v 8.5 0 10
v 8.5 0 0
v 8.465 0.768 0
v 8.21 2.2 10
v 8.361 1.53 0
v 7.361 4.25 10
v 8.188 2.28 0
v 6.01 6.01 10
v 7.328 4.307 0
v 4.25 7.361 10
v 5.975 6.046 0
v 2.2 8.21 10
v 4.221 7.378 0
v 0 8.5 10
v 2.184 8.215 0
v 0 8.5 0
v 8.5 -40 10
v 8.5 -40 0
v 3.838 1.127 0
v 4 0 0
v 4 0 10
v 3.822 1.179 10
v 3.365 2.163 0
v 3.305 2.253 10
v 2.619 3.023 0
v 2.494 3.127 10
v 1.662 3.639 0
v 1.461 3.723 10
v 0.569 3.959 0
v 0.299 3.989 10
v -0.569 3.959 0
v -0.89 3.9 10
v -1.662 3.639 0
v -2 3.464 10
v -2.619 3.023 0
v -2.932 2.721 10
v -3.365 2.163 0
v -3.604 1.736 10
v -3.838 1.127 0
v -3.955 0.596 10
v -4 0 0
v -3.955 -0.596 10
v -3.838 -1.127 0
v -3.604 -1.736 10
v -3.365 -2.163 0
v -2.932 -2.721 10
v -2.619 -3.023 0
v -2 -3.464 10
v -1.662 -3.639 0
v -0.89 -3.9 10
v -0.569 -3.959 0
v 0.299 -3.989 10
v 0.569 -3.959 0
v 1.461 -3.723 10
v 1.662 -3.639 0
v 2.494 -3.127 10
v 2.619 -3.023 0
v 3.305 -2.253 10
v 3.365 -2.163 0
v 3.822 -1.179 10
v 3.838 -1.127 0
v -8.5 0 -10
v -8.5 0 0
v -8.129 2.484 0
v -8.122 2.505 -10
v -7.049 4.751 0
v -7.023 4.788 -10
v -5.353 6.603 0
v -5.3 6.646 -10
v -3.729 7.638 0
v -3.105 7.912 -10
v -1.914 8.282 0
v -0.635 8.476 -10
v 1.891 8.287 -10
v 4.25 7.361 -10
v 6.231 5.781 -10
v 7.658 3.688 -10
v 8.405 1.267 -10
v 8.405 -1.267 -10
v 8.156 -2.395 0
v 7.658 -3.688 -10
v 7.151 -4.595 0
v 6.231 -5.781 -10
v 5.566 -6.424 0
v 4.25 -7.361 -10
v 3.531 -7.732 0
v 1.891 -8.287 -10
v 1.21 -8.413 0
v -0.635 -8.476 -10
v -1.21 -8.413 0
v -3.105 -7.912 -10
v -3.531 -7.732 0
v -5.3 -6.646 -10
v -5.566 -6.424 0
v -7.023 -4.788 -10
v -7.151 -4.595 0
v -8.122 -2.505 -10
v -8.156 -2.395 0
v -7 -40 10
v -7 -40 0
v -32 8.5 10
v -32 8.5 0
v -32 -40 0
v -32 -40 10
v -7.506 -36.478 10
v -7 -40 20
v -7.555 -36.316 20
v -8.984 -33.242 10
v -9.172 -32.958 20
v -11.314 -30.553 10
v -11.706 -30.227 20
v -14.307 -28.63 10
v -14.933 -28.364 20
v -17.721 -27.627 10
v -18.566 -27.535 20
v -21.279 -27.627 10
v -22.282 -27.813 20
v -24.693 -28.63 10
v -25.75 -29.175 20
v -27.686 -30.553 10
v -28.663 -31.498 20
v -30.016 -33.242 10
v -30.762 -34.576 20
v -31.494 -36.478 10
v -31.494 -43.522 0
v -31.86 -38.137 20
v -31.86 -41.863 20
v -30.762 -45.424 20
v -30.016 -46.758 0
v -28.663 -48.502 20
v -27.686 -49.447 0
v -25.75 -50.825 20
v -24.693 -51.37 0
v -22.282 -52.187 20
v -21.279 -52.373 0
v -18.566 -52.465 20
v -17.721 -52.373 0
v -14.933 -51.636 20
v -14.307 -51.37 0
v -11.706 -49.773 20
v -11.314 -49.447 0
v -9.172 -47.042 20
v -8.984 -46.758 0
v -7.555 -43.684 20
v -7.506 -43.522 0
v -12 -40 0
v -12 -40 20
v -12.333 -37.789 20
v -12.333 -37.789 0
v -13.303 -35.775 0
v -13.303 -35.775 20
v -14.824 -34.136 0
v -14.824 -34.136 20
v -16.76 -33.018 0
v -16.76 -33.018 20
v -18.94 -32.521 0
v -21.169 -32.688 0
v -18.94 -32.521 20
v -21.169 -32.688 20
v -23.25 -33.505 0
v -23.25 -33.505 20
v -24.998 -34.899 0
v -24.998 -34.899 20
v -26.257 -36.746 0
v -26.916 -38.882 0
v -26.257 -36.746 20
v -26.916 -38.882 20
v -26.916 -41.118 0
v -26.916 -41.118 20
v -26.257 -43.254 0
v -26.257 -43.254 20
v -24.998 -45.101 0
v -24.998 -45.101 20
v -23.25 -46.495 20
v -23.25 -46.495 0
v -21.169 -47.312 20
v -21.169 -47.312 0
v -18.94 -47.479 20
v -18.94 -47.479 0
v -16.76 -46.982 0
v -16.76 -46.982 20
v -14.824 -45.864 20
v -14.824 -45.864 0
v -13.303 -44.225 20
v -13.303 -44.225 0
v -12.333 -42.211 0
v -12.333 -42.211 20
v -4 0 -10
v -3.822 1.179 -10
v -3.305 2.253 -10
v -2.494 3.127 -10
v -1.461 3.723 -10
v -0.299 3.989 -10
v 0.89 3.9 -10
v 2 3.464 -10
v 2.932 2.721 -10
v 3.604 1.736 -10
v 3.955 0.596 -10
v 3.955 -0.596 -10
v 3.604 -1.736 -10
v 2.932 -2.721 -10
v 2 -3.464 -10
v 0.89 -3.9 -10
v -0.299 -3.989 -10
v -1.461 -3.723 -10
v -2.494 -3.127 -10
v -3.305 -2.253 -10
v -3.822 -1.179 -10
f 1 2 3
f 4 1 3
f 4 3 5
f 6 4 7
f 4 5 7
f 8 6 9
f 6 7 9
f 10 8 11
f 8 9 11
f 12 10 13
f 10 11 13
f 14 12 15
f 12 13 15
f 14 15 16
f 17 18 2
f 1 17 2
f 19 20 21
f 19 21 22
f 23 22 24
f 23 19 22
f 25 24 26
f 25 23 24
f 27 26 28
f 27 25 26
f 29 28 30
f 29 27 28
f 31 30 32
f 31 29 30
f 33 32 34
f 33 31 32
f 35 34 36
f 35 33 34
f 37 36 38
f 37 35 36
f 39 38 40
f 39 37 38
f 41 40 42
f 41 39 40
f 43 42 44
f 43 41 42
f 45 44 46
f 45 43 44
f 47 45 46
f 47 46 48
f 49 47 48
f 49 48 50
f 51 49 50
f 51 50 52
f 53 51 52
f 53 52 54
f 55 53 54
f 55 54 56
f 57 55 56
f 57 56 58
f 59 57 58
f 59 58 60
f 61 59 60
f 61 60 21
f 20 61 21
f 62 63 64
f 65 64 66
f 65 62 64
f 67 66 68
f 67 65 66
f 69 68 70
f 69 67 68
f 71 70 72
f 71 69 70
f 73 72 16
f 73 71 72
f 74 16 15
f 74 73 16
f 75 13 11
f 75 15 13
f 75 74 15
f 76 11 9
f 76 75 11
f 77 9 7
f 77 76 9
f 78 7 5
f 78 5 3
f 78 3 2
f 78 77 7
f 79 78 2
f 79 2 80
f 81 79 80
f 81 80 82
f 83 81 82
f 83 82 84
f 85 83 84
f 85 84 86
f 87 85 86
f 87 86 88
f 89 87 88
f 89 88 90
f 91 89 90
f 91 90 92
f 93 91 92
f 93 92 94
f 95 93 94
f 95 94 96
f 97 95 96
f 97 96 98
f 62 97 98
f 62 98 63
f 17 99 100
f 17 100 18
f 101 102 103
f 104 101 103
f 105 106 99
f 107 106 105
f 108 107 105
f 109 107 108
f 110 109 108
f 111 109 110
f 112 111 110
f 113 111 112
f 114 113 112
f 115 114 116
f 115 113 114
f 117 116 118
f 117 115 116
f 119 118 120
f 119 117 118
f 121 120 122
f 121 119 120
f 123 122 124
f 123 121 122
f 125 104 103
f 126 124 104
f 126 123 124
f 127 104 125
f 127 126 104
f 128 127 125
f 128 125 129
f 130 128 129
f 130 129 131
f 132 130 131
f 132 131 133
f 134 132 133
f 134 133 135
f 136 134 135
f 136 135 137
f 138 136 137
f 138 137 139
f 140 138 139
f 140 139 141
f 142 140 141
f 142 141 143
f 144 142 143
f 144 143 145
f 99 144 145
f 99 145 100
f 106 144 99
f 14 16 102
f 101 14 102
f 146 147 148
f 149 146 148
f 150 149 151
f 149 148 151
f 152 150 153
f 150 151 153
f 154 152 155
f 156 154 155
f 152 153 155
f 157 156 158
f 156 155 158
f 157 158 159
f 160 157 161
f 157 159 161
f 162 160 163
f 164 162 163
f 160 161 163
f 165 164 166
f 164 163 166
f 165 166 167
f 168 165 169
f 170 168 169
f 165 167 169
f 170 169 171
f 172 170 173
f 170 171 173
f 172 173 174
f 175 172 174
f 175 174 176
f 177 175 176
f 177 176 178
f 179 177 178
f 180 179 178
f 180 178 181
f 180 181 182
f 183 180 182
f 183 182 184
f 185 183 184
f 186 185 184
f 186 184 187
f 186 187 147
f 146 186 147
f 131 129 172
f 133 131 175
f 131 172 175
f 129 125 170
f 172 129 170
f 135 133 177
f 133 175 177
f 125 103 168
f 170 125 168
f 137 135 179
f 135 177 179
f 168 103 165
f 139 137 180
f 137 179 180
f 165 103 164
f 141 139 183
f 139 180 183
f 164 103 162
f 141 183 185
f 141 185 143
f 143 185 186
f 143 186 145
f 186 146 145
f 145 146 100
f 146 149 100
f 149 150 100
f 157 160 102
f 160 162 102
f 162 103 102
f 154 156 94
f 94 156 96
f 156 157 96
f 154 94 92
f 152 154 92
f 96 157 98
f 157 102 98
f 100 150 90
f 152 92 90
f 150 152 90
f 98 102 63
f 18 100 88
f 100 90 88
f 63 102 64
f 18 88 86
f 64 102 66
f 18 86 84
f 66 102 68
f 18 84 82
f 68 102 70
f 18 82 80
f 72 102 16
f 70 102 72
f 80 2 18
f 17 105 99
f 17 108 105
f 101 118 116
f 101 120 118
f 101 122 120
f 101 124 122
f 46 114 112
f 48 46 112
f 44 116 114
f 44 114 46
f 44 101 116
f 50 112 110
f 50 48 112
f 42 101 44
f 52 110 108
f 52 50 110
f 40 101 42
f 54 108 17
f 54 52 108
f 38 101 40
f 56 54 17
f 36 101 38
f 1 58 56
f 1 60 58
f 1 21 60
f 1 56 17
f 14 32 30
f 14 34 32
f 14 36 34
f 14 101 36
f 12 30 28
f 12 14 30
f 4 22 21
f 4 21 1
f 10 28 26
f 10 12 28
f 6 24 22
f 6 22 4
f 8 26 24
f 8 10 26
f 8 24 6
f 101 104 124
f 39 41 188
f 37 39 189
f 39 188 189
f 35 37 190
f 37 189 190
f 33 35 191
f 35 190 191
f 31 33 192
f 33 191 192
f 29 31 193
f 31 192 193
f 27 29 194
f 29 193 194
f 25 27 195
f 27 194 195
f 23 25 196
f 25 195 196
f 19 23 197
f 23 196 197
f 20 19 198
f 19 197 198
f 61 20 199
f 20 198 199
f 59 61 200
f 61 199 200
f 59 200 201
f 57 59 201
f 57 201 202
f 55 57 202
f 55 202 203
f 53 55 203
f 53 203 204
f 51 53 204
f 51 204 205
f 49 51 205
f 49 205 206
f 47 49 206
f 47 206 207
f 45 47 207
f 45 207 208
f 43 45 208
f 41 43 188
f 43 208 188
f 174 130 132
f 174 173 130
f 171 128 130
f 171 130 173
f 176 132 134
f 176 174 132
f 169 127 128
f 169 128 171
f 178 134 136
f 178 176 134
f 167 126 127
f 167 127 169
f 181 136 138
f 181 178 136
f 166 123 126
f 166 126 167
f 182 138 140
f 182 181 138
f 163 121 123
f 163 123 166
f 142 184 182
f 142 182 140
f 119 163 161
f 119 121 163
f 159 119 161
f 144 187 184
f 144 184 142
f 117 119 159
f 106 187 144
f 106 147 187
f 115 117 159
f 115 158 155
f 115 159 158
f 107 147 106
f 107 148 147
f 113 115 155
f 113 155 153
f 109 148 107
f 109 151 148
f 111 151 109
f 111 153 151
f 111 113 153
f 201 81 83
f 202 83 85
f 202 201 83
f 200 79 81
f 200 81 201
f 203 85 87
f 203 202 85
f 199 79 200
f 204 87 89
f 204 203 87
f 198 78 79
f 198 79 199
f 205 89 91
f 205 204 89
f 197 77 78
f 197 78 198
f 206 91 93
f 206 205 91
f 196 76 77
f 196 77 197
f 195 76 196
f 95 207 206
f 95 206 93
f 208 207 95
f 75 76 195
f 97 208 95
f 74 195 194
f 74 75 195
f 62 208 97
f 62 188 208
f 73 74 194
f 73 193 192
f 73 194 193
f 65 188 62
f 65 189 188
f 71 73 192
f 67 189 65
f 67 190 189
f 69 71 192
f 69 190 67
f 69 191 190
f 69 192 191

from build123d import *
from build123d.topology import SkipClean

# Parameters (mm, degrees)
SKETCH_1_R          = 4
EXTRUDE_1_DEPTH     = 10
CUT_EXTRUDE_1_DEPTH = 63.713634881
SKETCH_3_R          = 12.5
EXTRUDE_2_DEPTH     = 10
CUT_EXTRUDE_2_REACH = 64.292
SKETCH_4_R          = 7.5
EXTRUDE_START       = 10
SKETCH_5_R          = 12.5
SKETCH_5_R_2        = 7.5
EXTRUDE_3_DEPTH     = 10
SKETCH_6_R          = 8.5
SKETCH_6_R_2        = 4
EXTRUDE_4_DEPTH     = 10
EXTRUDE_START_2     = -10
EXTRUDE_5_DEPTH     = 10
CUT_EXTRUDE_3_DEPTH = 65.654852873


with BuildPart() as part:
    # Эскиз1 → Бобышка-Вытянуть1 (new body)
    with BuildSketch(Plane.XY):
        with BuildLine():
            Line((13, -15), (8.188495856, 2.280029742))
            ThreePointArc((8.188495856, 2.280029742), (2.584908604, 8.097422276), (-5.352868863, 6.602786907))
            Line((-5.352868863, 6.602786907), (-32, -15))
            Line((-32, -15), (-32, -40))
            Line((-32, -40), (-13, -40))
            ThreePointArc((-13, -40), (0, -53), (13, -40))
            Line((13, -40), (13, -15))
        make_face()
        Circle(SKETCH_1_R, mode=Mode.SUBTRACT)
    extrude(amount=EXTRUDE_1_DEPTH)

    # Эскиз2 → Вырез-Вытянуть1 (cut, through all)
    with BuildSketch(Plane.XY.offset(10)):
        with BuildLine():
            Line((-13, -40), (13, -40))
            ThreePointArc((13, -40), (0, -53), (-13, -40))
        make_face()
    extrude(amount=-CUT_EXTRUDE_1_DEPTH, mode=Mode.SUBTRACT)

    # Эскиз3 → Бобышка-Вытянуть2 (add)
    with BuildSketch(Plane.XY.offset(10)):
        with Locations((-19.5, -40)):
            Circle(SKETCH_3_R)
    extrude(amount=-EXTRUDE_2_DEPTH)

    # Эскиз4 → Вырез-Вытянуть2 (cut, up to next)
    with BuildSketch(Plane.XY.offset(10), mode=Mode.PRIVATE) as cut_extrude_2_sk1:
        with Locations((-19.5, -40)):
            Circle(SKETCH_4_R)
    cut_extrude_2_tool1 = extrude(cut_extrude_2_sk1.sketch, amount=-CUT_EXTRUDE_2_REACH, mode=Mode.PRIVATE) & part.part
    add(cut_extrude_2_tool1.solids().sort_by_distance((-19.5, -40, 10))[0], mode=Mode.SUBTRACT)

    # Эскиз5 → Бобышка-Вытянуть3 (add)
    with BuildSketch(Plane.XY.offset(10).offset(EXTRUDE_START)):
        with Locations((-19.5, -40)):
            Circle(SKETCH_5_R)
        with Locations((-19.5, -40)):
            Circle(SKETCH_5_R_2, mode=Mode.SUBTRACT)
    extrude(amount=-EXTRUDE_3_DEPTH)

    # Эскиз6 → Бобышка-Вытянуть4 (add)
    with SkipClean():  # the faces are left unmerged after this step: merging them gives an invalid solid
        with BuildSketch(Plane(origin=(0, 0, 0), x_dir=(-1, 0, 0), z_dir=(0, 0, -1)).offset(EXTRUDE_START)):
            Circle(SKETCH_6_R)
            Circle(SKETCH_6_R_2, mode=Mode.SUBTRACT)
        extrude(amount=-EXTRUDE_4_DEPTH)

    # Эскиз7 → Бобышка-Вытянуть5 (add)
    with SkipClean():  # the faces are left unmerged after this step: merging them gives an invalid solid
        with BuildSketch(Plane.XY.offset(10).offset(EXTRUDE_START_2)):
            with BuildLine():
                Line((-32, 8.5), (-32, -15))
                Line((-32, -15), (-5.352868863, 6.602786907))
                ThreePointArc((-5.352868863, 6.602786907), (-2.839569604, 8.011669268), (4e-08, 8.5))
                Line((4e-08, 8.5), (-32, 8.5))
            make_face()
            with BuildLine():
                Line((13, 8.5), (4e-08, 8.5))
                ThreePointArc((4e-08, 8.5), (5.14148556, 6.768687187), (8.188495856, 2.280029742))
                Line((8.188495856, 2.280029742), (13, -15))
                Line((13, -15), (13, 8.5))
            make_face()
        extrude(amount=EXTRUDE_5_DEPTH)
    add(part.part.scale(1), mode=Mode.REPLACE)  # the faces are merged on a copy

    # Эскиз8 → Вырез-Вытянуть3 (cut, through all)
    with BuildSketch(Plane(origin=(0, 0, 0), x_dir=(-1, 0, 0), z_dir=(0, 0, -1))):
        with BuildLine():
            Line((-8.5, -40), (-8.5, 0))
            ThreePointArc((-8.5, 0), (-6.01040764, 6.01040764), (0, 8.5))
            Line((0, 8.5), (-13, 8.5))
            Line((-13, 8.5), (-13, -40))
            Line((-13, -40), (-8.5, -40))
        make_face()
    extrude(amount=-CUT_EXTRUDE_3_DEPTH, mode=Mode.SUBTRACT)


solid = part.part
